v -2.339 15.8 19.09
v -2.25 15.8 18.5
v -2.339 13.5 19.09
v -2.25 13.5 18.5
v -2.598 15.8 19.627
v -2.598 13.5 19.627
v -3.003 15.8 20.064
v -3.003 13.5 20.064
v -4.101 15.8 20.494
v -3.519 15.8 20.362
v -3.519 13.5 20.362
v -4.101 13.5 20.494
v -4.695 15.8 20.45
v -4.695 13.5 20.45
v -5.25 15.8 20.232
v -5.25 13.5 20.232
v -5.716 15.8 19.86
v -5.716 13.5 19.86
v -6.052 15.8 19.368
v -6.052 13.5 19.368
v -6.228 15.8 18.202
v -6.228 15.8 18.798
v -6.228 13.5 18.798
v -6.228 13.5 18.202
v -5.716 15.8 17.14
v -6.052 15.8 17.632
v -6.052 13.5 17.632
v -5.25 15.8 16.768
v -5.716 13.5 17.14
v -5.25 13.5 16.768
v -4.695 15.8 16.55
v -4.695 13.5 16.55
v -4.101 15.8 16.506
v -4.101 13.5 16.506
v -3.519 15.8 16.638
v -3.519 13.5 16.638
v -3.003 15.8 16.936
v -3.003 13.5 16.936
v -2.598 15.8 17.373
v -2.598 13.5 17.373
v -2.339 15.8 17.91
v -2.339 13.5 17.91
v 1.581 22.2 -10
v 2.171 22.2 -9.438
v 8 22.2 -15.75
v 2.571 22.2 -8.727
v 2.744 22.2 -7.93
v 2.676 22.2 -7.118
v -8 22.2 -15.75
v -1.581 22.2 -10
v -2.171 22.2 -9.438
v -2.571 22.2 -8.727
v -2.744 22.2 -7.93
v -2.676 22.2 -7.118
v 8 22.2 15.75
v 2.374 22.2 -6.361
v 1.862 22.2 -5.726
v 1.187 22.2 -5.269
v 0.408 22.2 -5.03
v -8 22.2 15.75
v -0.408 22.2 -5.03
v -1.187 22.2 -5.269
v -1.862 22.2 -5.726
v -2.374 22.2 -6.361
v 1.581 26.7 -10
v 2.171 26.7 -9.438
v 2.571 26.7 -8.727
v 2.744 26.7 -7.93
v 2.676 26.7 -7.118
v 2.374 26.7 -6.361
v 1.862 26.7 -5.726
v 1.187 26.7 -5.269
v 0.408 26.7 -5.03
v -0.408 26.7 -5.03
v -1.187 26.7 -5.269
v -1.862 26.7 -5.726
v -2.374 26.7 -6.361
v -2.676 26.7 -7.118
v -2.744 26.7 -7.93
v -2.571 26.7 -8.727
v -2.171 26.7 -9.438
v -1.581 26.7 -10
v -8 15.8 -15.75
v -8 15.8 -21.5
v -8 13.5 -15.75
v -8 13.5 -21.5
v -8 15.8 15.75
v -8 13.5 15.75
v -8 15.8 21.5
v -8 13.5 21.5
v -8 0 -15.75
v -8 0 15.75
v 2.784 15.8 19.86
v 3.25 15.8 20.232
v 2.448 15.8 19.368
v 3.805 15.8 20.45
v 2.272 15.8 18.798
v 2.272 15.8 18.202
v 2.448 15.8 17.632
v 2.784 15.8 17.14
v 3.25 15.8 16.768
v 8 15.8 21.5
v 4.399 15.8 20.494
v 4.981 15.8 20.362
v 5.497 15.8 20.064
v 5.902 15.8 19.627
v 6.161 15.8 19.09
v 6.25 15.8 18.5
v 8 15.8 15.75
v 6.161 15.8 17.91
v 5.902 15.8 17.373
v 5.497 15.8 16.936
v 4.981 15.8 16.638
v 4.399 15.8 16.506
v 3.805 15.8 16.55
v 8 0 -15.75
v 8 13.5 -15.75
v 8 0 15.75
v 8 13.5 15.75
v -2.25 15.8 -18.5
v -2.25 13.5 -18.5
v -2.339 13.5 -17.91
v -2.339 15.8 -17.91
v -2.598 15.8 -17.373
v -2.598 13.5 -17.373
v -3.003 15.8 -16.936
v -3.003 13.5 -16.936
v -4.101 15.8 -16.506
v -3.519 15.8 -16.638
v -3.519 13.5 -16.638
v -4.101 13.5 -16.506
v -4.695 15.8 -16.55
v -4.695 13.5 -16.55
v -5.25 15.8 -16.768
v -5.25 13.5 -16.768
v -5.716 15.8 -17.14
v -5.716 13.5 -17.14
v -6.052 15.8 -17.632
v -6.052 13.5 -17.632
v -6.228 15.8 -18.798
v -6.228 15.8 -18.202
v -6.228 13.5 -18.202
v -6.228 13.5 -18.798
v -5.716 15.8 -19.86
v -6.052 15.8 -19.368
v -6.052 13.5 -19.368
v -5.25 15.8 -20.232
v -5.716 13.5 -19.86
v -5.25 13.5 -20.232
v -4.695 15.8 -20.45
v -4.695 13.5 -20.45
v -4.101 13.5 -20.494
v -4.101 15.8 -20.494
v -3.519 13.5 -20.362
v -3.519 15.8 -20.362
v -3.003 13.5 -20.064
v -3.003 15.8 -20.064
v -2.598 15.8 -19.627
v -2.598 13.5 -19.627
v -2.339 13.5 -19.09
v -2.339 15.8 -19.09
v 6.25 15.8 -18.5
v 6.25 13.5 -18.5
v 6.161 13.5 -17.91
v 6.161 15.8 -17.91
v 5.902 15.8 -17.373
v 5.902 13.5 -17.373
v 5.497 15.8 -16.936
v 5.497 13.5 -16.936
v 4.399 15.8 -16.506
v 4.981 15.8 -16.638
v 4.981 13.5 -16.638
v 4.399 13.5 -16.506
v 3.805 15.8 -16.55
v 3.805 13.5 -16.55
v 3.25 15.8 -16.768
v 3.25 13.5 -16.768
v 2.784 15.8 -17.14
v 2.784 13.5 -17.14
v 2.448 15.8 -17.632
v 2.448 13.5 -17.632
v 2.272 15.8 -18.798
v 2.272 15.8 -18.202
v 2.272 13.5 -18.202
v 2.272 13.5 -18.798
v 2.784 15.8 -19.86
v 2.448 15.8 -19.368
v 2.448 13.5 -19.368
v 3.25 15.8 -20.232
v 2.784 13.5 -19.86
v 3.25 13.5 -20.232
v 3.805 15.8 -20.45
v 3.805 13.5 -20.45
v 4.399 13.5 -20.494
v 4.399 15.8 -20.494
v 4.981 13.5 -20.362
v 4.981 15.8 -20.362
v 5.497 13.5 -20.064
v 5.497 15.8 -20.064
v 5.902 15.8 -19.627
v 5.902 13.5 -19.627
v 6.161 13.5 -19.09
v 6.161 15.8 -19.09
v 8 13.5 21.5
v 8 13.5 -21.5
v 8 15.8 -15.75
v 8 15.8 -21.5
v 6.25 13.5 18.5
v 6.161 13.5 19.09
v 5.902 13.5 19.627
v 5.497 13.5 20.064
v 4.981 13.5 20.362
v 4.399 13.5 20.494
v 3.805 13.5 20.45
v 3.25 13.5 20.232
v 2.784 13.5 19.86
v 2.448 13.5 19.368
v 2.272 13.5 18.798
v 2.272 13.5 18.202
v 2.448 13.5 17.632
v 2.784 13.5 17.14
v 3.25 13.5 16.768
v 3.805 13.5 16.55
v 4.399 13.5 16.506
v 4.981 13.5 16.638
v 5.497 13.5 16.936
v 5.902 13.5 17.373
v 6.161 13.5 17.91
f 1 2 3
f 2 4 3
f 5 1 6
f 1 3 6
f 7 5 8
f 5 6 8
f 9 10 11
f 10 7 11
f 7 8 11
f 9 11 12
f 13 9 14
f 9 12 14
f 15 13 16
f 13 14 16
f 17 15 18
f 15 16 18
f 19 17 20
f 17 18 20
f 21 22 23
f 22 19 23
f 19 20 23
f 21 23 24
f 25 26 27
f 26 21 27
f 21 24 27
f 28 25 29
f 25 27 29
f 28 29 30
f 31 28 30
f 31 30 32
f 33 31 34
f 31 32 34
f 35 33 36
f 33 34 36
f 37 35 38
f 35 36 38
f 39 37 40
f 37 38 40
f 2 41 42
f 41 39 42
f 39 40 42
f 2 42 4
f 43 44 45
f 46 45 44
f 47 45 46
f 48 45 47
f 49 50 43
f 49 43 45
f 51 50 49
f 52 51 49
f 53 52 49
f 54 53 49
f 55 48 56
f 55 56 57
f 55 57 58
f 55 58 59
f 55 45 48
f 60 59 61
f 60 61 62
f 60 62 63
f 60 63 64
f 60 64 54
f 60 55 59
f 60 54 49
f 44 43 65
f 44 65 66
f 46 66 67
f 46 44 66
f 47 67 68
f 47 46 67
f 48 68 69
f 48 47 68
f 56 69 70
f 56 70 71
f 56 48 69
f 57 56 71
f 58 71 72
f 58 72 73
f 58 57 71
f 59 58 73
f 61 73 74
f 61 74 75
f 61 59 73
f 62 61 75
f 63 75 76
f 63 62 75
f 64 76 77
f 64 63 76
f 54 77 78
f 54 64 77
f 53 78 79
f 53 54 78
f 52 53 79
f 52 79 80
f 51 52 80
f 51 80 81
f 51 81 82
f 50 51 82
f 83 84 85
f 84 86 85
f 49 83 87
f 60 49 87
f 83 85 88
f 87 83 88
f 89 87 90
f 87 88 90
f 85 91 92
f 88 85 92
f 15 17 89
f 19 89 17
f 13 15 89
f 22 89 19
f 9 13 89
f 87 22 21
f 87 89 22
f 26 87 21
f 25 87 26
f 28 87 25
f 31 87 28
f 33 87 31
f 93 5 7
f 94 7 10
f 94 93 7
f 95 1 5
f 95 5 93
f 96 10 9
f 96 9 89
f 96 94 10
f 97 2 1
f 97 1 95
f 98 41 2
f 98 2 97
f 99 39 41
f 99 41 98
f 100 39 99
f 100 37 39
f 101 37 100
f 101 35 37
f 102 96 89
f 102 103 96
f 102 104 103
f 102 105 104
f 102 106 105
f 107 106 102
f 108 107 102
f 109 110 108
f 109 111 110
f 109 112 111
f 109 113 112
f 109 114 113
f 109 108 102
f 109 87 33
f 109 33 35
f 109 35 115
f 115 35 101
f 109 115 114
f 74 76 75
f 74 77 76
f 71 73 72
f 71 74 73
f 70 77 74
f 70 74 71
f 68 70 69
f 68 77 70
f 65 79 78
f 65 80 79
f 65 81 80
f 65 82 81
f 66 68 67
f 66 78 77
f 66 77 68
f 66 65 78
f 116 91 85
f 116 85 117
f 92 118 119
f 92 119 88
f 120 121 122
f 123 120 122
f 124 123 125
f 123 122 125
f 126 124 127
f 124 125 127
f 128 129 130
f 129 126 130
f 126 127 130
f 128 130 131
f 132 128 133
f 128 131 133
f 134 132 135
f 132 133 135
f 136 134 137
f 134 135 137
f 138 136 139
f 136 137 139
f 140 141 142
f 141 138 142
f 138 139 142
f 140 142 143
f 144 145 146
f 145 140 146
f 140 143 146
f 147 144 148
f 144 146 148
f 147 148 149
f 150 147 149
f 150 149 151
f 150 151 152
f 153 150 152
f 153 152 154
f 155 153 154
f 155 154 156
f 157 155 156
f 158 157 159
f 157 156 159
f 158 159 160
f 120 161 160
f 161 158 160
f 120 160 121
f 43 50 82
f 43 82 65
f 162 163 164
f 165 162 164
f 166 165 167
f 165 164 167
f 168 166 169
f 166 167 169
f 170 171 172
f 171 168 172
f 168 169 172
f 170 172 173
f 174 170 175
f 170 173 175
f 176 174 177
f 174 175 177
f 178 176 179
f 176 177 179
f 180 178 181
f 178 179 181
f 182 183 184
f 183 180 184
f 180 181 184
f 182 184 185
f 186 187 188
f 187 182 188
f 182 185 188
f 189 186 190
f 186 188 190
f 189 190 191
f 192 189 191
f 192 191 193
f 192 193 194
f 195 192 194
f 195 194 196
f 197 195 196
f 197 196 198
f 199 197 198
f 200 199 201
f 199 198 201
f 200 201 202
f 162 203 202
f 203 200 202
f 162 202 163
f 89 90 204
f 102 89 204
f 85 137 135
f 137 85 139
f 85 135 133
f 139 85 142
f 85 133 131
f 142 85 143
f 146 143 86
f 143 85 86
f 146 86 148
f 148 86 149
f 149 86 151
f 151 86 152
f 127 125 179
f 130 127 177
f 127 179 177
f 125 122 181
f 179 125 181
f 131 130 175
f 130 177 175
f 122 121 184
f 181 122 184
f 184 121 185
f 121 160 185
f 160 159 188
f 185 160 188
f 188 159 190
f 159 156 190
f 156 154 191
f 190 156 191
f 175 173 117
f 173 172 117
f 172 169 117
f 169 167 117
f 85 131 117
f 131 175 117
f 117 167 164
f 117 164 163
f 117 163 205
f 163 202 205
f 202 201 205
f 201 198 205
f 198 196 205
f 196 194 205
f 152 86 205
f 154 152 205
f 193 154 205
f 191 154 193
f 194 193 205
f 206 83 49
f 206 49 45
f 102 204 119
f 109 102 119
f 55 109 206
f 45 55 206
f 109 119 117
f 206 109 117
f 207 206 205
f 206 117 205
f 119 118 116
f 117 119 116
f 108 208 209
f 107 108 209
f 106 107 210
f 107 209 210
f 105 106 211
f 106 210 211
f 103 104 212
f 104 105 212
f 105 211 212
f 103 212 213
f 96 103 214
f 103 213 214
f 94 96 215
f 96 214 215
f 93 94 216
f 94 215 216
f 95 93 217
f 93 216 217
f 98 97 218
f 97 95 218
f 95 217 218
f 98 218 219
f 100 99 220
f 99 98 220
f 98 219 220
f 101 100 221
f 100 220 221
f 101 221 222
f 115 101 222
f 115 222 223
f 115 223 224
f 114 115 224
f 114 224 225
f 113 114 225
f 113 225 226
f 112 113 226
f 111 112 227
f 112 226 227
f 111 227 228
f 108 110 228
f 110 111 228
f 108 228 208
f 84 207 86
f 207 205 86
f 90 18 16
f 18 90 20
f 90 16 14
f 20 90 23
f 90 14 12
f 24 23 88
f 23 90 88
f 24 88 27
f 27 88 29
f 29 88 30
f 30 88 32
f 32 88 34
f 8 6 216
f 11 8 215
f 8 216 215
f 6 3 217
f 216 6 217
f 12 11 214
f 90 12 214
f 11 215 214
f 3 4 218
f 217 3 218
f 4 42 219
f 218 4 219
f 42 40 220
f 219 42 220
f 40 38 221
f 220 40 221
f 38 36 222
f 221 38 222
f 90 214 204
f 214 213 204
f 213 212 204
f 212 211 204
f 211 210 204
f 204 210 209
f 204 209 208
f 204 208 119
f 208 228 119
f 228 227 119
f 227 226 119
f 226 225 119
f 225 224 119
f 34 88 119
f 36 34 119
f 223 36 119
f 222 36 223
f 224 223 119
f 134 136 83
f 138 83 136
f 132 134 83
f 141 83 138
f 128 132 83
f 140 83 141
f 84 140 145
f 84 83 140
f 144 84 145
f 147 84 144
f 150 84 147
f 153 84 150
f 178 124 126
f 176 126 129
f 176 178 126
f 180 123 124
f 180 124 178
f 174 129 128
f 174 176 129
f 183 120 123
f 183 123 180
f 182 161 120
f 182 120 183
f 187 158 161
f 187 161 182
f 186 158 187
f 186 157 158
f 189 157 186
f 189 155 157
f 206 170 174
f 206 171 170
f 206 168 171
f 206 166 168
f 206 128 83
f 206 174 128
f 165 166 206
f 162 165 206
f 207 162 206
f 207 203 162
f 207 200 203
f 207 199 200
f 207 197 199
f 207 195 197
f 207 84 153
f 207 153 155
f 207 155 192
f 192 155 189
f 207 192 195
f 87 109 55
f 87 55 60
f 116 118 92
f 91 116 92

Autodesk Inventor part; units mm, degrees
ref_plane "YZ Plane" through (0, 0, 0) normal (1, 0, 0) x (0, 1, 0)
ref_plane "XZ Plane" through (0, 0, 0) normal (0, 1, 0) x (-1, 0, 0)
ref_plane "XY Plane" through (0, 0, 0) normal (0, 0, 1) x (1, 0, 0)
sketch "스케치1" plane through (0, 0, 0) normal (0, 1, 0) x (-1, 0, 0)
  line L0 (-8, 15.75) -> (8, 15.75)
  line L1 (8, 15.75) -> (8, -15.75)
  line L2 (8, -15.75) -> (-8, -15.75)
  line L3 (-8, -15.75) -> (-8, 15.75)
  line L4 (-8, 15.75) -> (8, -15.75) construction
  line L5 (8, 15.75) -> (-8, -15.75) construction
  point P0 (0, 0)
  dimension "d0" = 16
  dimension "d1" = 31.5
extrude "돌출1" add sketch "스케치1" along normal blind 13.5
sketch "스케치2" plane through (0, 13.5, 0) normal (0, 1, 0) x (1, 0, 0)
  line L0 (-8, -21.5) -> (8, -21.5)
  line L1 (8, -21.5) -> (8, 21.5)
  line L2 (8, 21.5) -> (-8, 21.5)
  line L3 (-8, 21.5) -> (-8, -21.5)
  line L4 (-8, -21.5) -> (8, 21.5) construction
  line L5 (8, -21.5) -> (-8, 21.5) construction
  circle A0 centre (-4.25, -18.5) radius 2
  line L6 (0, 0) -> (0, -2.2737)
  line L7 (0, 0) -> (-1.7913, 0)
  circle A1 centre (4.25, -18.5) radius 2
  circle A2 centre (-4.25, 18.5) radius 2
  circle A3 centre (4.25, 18.5) radius 2
  point P0 (-8, 15.75)
  dimension "d4" = 43
  dimension "d5" = 4
  dimension "d6" = 37
  dimension "d7" = 8.5
extrude "돌출2" add sketch "스케치2" along normal blind 2.3
extrude "돌출3" add sketch "스케치1" along normal blind 22.2
sketch "스케치4" plane through (0, 22.2, 0) normal (0, 1, 0) x (1, 0, 0)
  circle A0 centre (0, 7.75) radius 2.75
  line L0 (8, 15.75) -> (-8, 15.75) projected
  line L1 (-1.5811, 10) -> (1.5811, 10)
  point P0 (0, 0)
  dimension "d12" = 8
  dimension "d13" = 5.5
  dimension "d14" = 0.5
extrude "돌출4" add sketch "스케치4" along normal blind 4.5 contours A0 L1 picked at (-0.1073, 8.3396)
properties part number "감속기어 모터'"
